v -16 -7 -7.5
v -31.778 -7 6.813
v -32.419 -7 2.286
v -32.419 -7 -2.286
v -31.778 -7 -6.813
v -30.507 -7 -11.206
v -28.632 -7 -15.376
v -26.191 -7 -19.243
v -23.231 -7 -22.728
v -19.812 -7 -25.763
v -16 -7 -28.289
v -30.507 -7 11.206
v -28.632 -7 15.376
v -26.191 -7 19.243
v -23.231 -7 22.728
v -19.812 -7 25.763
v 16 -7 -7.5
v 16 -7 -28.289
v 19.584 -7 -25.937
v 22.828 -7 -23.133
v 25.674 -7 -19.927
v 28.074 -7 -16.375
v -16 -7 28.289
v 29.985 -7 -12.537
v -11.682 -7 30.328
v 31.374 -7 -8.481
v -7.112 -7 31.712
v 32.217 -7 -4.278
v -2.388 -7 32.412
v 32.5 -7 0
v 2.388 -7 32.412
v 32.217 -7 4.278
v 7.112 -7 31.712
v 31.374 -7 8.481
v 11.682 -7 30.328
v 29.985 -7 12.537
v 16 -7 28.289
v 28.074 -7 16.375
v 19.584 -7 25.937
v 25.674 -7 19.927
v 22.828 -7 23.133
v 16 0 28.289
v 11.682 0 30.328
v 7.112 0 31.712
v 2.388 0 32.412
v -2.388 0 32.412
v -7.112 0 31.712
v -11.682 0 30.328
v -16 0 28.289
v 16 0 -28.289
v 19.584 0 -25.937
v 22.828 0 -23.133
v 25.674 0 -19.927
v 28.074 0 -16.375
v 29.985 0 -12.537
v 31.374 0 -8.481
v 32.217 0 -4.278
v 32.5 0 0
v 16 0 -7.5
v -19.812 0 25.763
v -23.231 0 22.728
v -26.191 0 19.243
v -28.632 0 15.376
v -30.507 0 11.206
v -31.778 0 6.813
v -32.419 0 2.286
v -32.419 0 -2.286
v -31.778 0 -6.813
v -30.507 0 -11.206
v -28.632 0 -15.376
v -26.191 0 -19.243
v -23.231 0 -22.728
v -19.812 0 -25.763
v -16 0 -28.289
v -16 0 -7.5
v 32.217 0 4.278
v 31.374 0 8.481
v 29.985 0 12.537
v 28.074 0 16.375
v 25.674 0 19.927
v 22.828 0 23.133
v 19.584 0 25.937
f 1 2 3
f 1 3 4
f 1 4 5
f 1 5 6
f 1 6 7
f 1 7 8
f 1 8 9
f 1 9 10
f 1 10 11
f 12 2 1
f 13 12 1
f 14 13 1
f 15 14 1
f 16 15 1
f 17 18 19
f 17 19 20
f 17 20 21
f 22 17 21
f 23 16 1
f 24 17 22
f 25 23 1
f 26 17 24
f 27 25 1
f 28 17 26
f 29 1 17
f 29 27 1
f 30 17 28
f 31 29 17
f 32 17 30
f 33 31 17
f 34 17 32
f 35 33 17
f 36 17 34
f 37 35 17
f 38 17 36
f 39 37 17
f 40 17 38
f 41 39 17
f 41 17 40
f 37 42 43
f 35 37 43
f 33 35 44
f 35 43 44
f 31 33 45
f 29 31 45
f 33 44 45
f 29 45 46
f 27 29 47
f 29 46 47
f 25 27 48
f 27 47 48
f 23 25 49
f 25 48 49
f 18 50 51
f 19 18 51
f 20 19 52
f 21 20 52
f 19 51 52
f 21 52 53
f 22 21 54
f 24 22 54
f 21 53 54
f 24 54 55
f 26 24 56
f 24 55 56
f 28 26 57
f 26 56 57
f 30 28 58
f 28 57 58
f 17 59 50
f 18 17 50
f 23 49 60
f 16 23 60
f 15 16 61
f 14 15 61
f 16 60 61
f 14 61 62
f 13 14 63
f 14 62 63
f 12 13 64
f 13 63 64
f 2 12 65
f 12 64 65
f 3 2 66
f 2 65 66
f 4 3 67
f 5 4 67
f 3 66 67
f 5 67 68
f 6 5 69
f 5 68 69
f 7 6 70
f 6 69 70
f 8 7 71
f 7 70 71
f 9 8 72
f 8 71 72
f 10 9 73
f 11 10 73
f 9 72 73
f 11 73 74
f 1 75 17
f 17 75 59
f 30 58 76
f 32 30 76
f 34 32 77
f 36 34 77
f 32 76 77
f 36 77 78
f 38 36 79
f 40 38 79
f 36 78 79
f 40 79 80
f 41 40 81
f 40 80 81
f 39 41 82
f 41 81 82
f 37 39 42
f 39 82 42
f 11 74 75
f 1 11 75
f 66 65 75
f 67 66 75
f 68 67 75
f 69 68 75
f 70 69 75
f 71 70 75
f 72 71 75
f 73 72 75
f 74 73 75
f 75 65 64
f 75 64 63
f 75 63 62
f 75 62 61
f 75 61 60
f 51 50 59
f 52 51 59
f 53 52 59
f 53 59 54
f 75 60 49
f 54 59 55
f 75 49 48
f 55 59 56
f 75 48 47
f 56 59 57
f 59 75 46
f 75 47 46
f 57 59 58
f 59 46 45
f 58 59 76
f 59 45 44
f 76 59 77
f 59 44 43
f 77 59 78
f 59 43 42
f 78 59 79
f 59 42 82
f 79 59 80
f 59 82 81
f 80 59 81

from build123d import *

# Parameters (mm, degrees)
F1_DEPTH = 7


with BuildPart() as f1:
    # F0 (on Front) → F1 (new body)
    with BuildSketch(Plane.XZ):
        with BuildLine():
            Line((-16, -7.5), (-16, 28.2886903196))
            ThreePointArc((-16, 28.2886903196), (-32.5, 0), (-16, -28.2886903196))
            Line((-16, -28.2886903196), (-16, -7.5))
        make_face()
        with BuildLine():
            Line((16, -7.5), (16, 28.2886903196))
            ThreePointArc((16, 28.2886903196), (0, 32.5), (-16, 28.2886903196))
            Line((-16, 28.2886903196), (-16, -7.5))
            Line((-16, -7.5), (16, -7.5))
        make_face()
        with BuildLine():
            ThreePointArc((16, -28.2886903196), (28.0735640773, -16.3745228938), (32.5, 0))
            ThreePointArc((32.5, 0), (28.0735640773, 16.3745228938), (16, 28.2886903196))
            Line((16, 28.2886903196), (16, -7.5))
            Line((16, -7.5), (16, -28.2886903196))
        make_face()
    extrude(amount=F1_DEPTH)


solid = f1.part
